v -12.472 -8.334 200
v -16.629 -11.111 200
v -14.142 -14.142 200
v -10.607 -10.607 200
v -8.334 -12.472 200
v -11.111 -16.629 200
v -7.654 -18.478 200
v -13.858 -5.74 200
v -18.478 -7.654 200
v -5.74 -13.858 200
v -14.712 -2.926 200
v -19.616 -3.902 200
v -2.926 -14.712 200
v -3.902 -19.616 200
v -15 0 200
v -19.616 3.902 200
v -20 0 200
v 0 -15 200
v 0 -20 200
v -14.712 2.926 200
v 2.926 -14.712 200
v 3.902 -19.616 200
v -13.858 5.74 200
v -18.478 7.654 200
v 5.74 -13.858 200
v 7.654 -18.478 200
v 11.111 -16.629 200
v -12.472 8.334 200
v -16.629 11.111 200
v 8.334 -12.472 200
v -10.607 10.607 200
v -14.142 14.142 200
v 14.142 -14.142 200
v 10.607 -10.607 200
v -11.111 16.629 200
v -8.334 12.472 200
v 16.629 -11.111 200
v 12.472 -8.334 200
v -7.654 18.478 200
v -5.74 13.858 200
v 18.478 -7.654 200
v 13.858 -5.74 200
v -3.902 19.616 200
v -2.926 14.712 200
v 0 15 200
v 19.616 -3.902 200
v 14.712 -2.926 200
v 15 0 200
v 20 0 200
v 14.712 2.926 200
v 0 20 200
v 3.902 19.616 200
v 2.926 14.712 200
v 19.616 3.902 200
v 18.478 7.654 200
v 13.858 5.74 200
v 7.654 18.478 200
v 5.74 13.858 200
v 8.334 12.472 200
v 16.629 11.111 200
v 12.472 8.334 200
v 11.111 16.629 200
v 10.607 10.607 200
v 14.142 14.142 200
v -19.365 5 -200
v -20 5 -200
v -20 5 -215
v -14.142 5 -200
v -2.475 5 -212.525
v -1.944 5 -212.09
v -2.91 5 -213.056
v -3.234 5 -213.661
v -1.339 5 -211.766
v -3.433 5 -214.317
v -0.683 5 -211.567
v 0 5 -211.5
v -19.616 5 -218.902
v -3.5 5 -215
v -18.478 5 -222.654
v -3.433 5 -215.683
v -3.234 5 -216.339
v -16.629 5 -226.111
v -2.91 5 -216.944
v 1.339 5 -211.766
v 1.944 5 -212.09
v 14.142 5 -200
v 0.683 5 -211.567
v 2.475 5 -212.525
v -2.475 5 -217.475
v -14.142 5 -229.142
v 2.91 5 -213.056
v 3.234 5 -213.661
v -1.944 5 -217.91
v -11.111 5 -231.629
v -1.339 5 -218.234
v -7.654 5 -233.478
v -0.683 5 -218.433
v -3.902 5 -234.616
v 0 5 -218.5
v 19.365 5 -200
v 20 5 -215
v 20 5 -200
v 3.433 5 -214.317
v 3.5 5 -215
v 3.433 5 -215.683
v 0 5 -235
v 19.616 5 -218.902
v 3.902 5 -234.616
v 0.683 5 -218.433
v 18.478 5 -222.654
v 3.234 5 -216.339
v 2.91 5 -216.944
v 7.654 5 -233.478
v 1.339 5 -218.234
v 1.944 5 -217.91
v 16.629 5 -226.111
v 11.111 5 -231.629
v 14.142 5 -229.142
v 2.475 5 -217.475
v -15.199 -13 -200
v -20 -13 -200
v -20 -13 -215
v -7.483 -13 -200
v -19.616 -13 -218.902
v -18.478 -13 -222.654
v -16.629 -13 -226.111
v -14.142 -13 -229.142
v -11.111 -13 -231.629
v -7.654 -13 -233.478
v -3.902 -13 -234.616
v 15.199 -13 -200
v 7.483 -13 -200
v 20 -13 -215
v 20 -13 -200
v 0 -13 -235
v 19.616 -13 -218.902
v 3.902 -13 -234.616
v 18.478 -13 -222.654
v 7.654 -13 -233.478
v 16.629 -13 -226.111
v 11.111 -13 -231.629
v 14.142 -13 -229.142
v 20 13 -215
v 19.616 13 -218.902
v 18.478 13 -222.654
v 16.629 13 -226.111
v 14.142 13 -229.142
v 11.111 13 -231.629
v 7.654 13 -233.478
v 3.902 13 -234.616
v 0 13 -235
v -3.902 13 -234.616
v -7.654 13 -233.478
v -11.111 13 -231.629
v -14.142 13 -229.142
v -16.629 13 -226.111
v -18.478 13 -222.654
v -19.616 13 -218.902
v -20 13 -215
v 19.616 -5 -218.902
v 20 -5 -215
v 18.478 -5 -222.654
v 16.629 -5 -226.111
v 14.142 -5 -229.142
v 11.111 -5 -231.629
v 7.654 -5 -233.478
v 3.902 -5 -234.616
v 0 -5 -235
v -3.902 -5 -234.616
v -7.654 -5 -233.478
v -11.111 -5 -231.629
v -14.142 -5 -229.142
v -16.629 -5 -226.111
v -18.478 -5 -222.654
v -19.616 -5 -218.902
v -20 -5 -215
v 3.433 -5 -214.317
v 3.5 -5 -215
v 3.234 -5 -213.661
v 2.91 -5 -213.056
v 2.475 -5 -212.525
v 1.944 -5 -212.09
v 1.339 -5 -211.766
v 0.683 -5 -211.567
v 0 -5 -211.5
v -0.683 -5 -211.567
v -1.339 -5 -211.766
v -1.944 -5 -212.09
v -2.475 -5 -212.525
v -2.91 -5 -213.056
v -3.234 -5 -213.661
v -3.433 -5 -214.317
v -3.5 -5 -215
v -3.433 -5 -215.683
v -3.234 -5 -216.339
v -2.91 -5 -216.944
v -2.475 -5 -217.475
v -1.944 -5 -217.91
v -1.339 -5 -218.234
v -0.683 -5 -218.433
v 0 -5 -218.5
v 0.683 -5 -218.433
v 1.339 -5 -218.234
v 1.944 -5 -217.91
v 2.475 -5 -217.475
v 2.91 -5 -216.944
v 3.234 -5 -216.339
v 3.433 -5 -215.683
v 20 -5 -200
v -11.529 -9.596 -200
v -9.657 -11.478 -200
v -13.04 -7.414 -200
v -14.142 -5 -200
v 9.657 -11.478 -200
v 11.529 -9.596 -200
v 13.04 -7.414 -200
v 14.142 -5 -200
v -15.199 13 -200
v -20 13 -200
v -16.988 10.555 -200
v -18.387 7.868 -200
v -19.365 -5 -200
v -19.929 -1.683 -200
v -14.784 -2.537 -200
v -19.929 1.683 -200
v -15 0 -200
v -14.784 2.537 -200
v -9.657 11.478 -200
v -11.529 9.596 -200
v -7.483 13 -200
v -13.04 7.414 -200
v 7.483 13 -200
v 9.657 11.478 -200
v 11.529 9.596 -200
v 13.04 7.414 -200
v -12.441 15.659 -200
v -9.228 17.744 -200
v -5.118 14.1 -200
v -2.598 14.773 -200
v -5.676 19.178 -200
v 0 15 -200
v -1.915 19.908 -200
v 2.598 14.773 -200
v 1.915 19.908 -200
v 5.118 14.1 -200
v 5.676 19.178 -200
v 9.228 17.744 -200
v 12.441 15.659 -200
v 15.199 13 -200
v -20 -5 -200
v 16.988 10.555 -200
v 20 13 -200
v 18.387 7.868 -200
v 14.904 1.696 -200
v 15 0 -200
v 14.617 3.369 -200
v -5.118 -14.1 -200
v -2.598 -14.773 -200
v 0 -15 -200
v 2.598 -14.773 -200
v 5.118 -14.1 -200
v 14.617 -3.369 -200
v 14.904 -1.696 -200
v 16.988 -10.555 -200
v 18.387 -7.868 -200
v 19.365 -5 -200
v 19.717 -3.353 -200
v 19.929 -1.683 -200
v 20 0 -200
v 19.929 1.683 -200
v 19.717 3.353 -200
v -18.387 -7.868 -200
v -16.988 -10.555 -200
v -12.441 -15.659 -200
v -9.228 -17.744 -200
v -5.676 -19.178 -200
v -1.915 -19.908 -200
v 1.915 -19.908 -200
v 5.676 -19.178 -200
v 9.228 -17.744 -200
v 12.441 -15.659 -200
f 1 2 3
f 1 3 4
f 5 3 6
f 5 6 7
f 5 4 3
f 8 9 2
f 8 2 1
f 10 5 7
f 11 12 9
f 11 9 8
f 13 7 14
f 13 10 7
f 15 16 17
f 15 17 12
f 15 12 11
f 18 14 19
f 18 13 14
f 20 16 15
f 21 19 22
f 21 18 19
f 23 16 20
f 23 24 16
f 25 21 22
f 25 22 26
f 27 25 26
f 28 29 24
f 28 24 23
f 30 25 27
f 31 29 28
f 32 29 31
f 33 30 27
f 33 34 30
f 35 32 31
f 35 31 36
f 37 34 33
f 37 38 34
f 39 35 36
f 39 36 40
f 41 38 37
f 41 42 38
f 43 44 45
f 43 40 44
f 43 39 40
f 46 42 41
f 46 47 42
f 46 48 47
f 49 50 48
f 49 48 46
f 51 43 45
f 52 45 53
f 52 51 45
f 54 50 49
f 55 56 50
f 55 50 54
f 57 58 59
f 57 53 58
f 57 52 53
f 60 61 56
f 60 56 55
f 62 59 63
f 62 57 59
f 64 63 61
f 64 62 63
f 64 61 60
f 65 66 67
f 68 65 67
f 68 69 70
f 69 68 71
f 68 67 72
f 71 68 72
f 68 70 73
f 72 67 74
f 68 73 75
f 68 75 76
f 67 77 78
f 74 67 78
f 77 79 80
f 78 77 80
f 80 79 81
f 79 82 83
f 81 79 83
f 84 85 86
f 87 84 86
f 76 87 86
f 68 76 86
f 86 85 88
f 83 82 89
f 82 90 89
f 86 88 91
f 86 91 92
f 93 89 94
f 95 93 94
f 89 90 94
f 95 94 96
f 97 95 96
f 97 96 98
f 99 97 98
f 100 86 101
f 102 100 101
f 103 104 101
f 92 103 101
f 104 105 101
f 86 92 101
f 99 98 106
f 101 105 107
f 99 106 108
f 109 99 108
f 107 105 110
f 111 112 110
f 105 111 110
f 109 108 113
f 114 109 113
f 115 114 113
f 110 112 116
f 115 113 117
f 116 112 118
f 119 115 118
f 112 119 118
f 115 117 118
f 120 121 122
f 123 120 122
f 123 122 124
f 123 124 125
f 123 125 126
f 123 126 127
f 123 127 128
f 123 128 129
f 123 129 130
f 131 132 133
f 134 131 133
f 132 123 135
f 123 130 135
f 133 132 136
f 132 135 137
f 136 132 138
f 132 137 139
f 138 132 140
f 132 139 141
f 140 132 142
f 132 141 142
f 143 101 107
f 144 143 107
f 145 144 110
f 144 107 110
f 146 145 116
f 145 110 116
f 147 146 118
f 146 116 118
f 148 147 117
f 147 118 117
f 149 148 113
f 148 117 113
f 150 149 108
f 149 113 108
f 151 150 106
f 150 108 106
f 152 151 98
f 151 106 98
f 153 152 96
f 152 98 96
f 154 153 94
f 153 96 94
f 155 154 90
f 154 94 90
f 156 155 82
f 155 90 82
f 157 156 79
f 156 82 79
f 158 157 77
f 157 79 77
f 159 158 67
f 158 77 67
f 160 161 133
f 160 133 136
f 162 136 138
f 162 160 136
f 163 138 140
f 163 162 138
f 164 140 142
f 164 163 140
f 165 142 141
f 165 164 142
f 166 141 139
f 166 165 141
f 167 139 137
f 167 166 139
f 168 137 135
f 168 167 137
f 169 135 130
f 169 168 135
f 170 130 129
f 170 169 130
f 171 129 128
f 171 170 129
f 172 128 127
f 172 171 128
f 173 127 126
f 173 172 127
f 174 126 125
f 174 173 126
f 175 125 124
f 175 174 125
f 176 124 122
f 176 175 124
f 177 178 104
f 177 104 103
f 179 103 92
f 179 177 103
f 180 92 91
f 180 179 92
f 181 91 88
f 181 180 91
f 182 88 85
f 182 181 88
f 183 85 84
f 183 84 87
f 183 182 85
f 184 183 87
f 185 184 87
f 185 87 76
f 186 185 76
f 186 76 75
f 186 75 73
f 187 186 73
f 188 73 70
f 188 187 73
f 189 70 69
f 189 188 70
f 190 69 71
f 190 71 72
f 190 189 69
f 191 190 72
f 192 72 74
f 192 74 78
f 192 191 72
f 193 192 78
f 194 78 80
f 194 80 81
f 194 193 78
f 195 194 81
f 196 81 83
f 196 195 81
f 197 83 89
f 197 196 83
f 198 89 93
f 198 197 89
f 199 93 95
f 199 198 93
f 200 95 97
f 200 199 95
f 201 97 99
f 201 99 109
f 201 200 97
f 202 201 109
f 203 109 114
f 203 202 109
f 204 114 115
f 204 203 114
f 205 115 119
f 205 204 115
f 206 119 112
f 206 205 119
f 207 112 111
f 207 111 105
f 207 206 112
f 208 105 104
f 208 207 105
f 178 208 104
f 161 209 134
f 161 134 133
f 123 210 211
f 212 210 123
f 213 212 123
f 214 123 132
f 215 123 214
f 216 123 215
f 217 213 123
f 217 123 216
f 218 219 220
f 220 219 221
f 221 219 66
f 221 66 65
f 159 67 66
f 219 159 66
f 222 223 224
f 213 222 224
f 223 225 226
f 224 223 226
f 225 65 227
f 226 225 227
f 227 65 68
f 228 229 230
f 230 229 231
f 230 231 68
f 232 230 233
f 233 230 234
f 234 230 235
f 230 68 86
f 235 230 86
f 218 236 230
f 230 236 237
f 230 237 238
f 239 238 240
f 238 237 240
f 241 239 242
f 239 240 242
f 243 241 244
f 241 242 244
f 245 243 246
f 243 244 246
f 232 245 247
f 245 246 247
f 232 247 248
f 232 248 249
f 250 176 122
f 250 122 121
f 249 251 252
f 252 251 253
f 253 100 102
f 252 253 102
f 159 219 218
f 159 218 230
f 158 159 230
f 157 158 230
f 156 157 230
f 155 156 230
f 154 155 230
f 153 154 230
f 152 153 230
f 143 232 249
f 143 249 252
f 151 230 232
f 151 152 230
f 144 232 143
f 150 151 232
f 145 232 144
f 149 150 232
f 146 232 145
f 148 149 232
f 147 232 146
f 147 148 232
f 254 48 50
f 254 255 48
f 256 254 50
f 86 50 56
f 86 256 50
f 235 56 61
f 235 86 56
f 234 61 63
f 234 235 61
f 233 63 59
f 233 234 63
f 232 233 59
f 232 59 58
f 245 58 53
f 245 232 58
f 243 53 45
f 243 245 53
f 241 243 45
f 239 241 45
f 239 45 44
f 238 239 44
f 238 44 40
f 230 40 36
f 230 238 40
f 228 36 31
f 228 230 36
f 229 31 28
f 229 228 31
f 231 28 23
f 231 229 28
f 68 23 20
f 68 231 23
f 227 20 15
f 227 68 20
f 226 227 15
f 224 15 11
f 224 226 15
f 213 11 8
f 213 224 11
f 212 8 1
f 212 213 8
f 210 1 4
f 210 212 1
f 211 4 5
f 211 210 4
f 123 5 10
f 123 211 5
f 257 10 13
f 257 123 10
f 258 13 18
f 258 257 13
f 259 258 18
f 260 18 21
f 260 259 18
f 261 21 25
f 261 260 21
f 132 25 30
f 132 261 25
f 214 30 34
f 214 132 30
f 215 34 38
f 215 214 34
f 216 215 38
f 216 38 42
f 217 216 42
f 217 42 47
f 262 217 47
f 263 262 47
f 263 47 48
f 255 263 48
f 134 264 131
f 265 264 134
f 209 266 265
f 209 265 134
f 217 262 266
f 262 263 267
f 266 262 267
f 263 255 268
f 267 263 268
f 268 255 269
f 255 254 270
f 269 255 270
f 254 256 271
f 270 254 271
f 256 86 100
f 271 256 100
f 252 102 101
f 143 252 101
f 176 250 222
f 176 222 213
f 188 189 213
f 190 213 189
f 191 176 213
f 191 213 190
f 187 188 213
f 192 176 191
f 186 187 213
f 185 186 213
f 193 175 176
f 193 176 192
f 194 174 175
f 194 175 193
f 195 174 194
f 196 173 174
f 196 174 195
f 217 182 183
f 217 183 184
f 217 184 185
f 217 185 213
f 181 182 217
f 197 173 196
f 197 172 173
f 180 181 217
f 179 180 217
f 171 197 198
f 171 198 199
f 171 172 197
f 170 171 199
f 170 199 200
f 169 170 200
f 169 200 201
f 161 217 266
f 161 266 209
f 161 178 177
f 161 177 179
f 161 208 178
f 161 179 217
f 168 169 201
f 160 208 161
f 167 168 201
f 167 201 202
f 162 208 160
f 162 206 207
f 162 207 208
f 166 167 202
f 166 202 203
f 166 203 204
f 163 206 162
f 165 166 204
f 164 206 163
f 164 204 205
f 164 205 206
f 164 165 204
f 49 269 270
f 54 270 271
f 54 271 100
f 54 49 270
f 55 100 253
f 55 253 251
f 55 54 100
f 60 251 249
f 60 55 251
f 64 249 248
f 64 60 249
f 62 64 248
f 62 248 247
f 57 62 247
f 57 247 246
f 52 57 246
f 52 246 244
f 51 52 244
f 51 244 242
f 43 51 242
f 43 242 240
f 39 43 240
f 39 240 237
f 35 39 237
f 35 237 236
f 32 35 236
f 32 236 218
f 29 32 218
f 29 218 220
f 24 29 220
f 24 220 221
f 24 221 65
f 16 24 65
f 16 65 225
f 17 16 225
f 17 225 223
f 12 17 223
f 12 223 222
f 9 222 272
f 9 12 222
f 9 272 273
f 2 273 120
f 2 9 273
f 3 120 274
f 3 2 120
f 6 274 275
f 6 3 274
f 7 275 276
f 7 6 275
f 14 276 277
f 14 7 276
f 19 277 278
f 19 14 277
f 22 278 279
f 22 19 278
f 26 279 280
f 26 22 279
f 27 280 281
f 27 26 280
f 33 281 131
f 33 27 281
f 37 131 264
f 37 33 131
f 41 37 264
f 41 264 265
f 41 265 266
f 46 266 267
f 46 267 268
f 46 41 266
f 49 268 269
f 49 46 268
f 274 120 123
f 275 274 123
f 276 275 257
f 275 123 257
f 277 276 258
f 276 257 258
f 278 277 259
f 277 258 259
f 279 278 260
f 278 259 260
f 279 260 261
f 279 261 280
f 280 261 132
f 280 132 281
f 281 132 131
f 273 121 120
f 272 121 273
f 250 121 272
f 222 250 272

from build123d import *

# Parameters (mm, degrees)
SKETCH1_R           = 20
SKETCH1_R_2         = 15
BOSS_EXTRUDE1_DEPTH = 200
BOSS_EXTRUDE5_START = 5
BOSS_EXTRUDE5_DEPTH = 8
BOSS_EXTRUDE6_START = -13
BOSS_EXTRUDE6_DEPTH = 8
BOSS_EXTRUDE7_START = -8
SKETCH7_R           = 3.5
BOSS_EXTRUDE7_DEPTH = 10


with BuildPart() as part:
    # Sketch1 → Boss-Extrude1 (new, symmetric)
    with BuildSketch(Plane.XY):
        Circle(SKETCH1_R)
        Circle(SKETCH1_R_2, mode=Mode.SUBTRACT)
    extrude(amount=BOSS_EXTRUDE1_DEPTH, both=True)

    # Sketch6 → Boss-Extrude5 (add)
    with BuildSketch(Plane(origin=(0, 0, 0), x_dir=(1, 0, 0), z_dir=(0, 1, 0)).offset(BOSS_EXTRUDE5_START)):
        with BuildLine():
            Line((-20, 200), (20, 200))
            Line((20, 200), (20, 215))
            ThreePointArc((20, 215), (0, 235), (-20, 215))
            Line((-20, 215), (-20, 200))
        make_face()
    extrude(amount=BOSS_EXTRUDE5_DEPTH)

    # Sketch6<2> → Boss-Extrude6 (add)
    with BuildSketch(Plane(origin=(0, 0, 0), x_dir=(1, 0, 0), z_dir=(0, 1, 0)).offset(BOSS_EXTRUDE6_START)):
        with BuildLine():
            Line((-20, 200), (20, 200))
            Line((20, 200), (20, 215))
            ThreePointArc((20, 215), (0, 235), (-20, 215))
            Line((-20, 215), (-20, 200))
        make_face()
    extrude(amount=BOSS_EXTRUDE6_DEPTH)

    # Sketch7 → Boss-Extrude7 (add)
    with BuildSketch(Plane.XZ.offset(13).offset(BOSS_EXTRUDE7_START)):
        with Locations((0, -215)):
            Circle(SKETCH7_R)
    extrude(amount=-BOSS_EXTRUDE7_DEPTH)


solid = part.part
